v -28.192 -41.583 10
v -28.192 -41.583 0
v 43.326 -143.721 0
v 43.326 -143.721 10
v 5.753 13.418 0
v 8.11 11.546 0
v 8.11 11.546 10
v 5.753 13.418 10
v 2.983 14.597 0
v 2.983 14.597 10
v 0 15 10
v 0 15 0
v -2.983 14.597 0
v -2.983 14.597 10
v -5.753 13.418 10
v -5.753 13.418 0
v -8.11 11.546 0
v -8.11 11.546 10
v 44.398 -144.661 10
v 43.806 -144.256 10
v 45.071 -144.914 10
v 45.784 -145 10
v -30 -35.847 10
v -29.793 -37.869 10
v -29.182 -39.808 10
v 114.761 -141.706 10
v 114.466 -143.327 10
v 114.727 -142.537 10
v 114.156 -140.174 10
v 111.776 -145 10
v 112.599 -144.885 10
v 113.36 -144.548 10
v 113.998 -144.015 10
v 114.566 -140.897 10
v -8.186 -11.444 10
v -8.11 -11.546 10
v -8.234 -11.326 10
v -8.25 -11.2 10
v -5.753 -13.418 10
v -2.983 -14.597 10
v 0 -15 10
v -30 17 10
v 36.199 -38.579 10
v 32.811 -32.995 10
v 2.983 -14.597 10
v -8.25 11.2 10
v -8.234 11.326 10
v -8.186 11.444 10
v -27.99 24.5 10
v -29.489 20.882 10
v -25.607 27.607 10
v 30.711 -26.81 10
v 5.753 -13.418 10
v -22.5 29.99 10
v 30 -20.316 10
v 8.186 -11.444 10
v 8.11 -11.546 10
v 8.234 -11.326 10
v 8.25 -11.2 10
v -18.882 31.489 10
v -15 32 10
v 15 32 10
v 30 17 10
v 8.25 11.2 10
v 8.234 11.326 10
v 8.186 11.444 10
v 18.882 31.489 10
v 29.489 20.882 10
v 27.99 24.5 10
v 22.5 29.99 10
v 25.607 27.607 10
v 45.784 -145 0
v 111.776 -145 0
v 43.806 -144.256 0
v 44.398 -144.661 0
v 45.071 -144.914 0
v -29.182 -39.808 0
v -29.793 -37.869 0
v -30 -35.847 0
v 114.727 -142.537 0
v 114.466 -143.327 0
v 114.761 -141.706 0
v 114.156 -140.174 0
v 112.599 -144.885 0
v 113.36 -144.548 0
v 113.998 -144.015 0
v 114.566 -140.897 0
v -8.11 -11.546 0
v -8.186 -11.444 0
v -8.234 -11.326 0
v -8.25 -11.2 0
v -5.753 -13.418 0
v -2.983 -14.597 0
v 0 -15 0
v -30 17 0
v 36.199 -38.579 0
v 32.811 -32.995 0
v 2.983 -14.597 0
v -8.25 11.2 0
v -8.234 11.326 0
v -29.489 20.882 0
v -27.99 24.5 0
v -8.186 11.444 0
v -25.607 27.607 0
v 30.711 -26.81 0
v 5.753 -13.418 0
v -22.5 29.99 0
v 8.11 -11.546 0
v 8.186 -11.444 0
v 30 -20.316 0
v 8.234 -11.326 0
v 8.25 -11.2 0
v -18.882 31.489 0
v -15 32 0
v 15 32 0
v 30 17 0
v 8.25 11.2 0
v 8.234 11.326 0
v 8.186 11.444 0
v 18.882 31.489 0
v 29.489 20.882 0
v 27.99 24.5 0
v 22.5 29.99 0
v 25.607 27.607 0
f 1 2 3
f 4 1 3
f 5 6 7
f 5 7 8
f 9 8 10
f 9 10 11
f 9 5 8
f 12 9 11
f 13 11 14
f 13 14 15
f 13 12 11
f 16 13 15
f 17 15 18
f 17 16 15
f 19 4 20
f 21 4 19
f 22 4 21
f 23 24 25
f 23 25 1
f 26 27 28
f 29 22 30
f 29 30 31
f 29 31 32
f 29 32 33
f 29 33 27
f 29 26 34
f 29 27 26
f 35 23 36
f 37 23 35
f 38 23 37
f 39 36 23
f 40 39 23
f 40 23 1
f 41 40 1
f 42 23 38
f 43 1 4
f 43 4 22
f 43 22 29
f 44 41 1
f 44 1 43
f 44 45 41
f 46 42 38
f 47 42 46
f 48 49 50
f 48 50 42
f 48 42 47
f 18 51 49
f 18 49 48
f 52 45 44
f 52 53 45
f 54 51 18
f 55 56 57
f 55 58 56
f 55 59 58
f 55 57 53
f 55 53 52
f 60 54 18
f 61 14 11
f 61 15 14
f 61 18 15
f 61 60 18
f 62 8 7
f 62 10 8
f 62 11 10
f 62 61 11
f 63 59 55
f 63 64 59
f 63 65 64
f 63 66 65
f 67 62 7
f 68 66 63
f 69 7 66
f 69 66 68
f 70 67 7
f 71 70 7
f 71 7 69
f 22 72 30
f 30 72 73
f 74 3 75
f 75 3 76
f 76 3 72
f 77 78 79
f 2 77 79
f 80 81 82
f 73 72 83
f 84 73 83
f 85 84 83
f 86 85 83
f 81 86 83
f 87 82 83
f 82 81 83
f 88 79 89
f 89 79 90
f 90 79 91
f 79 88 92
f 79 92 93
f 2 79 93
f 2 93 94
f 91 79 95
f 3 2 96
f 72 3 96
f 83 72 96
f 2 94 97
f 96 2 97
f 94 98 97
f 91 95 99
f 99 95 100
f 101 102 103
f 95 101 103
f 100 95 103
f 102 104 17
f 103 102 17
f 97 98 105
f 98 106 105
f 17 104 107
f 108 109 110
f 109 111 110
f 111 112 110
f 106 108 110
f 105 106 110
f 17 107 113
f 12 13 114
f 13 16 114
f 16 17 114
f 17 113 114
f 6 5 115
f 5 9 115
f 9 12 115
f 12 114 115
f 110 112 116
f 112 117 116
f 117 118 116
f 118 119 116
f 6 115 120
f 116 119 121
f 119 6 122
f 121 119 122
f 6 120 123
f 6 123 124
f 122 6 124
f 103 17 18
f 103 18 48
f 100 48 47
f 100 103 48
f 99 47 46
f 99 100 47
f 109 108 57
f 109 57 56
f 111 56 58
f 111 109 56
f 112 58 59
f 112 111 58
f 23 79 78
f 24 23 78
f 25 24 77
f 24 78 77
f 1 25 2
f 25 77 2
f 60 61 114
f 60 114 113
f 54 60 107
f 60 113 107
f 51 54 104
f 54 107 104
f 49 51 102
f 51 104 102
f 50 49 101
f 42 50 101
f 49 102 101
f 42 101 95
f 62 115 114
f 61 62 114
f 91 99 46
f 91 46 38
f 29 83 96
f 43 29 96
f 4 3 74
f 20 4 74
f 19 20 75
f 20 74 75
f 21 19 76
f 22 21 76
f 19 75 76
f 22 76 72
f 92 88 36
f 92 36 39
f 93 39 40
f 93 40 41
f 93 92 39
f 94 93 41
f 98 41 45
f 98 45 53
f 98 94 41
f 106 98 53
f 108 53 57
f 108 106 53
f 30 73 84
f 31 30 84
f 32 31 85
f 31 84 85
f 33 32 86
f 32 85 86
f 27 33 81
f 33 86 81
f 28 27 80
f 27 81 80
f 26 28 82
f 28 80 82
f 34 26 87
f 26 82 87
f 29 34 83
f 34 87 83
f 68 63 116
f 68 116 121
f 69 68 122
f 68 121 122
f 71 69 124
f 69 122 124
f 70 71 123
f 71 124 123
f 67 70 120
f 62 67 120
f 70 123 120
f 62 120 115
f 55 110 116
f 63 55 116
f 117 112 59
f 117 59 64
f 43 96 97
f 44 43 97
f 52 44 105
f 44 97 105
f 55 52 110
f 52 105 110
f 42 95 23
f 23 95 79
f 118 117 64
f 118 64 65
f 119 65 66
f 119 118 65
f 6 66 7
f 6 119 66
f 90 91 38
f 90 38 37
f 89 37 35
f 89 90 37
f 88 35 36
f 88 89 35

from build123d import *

# Parameters (mm, degrees)
EXTRUDE1_DEPTH = 10


with BuildPart() as part:
    # Sketch1 → Extrude1 (new body)
    with BuildSketch(Plane.XY):
        with BuildLine():
            Line((15, 32), (-15, 32))
            ThreePointArc((-15, 32), (-25.606601718, 27.606601718), (-30, 17))
            Line((-30, 17), (-30, -35.847012111))
            ThreePointArc((-30, -35.847012111), (-29.537169507, -38.854070106), (-28.191520443, -41.582776475))
            Line((-28.191520443, -41.582776475), (43.326244069, -143.720729309))
            ThreePointArc((43.326244069, -143.720729309), (44.398454362, -144.6610325), (45.783700202, -145))
            Line((45.783700202, -145), (111.775541918, -145))
            ThreePointArc((111.775541918, -145), (114.466160142, -143.326866071), (114.155601938, -140.173715713))
            Line((114.155601938, -140.173715713), (36.199399791, -38.579215104))
            ThreePointArc((36.199399791, -38.579215104), (31.592096115, -29.959556193), (30, -20.316372234))
            Line((30, -20.316372234), (30, 17))
            ThreePointArc((30, 17), (25.606601718, 27.606601718), (15, 32))
        make_face()
        with BuildLine():
            Line((8.25, -11.199832213), (8.25, 11.199832213))
            ThreePointArc((8.25, 11.199832213), (8.213806295, 11.386604055), (8.110465116, 11.546336037))
            ThreePointArc((8.110465116, 11.546336037), (0, 15), (-8.110465116, 11.546336037))
            ThreePointArc((-8.110465116, 11.546336037), (-8.213806295, 11.386604055), (-8.25, 11.199832213))
            Line((-8.25, 11.199832213), (-8.25, -11.199832213))
            ThreePointArc((-8.25, -11.199832213), (-8.213806295, -11.386604055), (-8.110465116, -11.546336037))
            ThreePointArc((-8.110465116, -11.546336037), (0, -15), (8.110465116, -11.546336037))
            ThreePointArc((8.110465116, -11.546336037), (8.213806295, -11.386604055), (8.25, -11.199832213))
        make_face(mode=Mode.SUBTRACT)
    extrude(amount=EXTRUDE1_DEPTH)


solid = part.part
